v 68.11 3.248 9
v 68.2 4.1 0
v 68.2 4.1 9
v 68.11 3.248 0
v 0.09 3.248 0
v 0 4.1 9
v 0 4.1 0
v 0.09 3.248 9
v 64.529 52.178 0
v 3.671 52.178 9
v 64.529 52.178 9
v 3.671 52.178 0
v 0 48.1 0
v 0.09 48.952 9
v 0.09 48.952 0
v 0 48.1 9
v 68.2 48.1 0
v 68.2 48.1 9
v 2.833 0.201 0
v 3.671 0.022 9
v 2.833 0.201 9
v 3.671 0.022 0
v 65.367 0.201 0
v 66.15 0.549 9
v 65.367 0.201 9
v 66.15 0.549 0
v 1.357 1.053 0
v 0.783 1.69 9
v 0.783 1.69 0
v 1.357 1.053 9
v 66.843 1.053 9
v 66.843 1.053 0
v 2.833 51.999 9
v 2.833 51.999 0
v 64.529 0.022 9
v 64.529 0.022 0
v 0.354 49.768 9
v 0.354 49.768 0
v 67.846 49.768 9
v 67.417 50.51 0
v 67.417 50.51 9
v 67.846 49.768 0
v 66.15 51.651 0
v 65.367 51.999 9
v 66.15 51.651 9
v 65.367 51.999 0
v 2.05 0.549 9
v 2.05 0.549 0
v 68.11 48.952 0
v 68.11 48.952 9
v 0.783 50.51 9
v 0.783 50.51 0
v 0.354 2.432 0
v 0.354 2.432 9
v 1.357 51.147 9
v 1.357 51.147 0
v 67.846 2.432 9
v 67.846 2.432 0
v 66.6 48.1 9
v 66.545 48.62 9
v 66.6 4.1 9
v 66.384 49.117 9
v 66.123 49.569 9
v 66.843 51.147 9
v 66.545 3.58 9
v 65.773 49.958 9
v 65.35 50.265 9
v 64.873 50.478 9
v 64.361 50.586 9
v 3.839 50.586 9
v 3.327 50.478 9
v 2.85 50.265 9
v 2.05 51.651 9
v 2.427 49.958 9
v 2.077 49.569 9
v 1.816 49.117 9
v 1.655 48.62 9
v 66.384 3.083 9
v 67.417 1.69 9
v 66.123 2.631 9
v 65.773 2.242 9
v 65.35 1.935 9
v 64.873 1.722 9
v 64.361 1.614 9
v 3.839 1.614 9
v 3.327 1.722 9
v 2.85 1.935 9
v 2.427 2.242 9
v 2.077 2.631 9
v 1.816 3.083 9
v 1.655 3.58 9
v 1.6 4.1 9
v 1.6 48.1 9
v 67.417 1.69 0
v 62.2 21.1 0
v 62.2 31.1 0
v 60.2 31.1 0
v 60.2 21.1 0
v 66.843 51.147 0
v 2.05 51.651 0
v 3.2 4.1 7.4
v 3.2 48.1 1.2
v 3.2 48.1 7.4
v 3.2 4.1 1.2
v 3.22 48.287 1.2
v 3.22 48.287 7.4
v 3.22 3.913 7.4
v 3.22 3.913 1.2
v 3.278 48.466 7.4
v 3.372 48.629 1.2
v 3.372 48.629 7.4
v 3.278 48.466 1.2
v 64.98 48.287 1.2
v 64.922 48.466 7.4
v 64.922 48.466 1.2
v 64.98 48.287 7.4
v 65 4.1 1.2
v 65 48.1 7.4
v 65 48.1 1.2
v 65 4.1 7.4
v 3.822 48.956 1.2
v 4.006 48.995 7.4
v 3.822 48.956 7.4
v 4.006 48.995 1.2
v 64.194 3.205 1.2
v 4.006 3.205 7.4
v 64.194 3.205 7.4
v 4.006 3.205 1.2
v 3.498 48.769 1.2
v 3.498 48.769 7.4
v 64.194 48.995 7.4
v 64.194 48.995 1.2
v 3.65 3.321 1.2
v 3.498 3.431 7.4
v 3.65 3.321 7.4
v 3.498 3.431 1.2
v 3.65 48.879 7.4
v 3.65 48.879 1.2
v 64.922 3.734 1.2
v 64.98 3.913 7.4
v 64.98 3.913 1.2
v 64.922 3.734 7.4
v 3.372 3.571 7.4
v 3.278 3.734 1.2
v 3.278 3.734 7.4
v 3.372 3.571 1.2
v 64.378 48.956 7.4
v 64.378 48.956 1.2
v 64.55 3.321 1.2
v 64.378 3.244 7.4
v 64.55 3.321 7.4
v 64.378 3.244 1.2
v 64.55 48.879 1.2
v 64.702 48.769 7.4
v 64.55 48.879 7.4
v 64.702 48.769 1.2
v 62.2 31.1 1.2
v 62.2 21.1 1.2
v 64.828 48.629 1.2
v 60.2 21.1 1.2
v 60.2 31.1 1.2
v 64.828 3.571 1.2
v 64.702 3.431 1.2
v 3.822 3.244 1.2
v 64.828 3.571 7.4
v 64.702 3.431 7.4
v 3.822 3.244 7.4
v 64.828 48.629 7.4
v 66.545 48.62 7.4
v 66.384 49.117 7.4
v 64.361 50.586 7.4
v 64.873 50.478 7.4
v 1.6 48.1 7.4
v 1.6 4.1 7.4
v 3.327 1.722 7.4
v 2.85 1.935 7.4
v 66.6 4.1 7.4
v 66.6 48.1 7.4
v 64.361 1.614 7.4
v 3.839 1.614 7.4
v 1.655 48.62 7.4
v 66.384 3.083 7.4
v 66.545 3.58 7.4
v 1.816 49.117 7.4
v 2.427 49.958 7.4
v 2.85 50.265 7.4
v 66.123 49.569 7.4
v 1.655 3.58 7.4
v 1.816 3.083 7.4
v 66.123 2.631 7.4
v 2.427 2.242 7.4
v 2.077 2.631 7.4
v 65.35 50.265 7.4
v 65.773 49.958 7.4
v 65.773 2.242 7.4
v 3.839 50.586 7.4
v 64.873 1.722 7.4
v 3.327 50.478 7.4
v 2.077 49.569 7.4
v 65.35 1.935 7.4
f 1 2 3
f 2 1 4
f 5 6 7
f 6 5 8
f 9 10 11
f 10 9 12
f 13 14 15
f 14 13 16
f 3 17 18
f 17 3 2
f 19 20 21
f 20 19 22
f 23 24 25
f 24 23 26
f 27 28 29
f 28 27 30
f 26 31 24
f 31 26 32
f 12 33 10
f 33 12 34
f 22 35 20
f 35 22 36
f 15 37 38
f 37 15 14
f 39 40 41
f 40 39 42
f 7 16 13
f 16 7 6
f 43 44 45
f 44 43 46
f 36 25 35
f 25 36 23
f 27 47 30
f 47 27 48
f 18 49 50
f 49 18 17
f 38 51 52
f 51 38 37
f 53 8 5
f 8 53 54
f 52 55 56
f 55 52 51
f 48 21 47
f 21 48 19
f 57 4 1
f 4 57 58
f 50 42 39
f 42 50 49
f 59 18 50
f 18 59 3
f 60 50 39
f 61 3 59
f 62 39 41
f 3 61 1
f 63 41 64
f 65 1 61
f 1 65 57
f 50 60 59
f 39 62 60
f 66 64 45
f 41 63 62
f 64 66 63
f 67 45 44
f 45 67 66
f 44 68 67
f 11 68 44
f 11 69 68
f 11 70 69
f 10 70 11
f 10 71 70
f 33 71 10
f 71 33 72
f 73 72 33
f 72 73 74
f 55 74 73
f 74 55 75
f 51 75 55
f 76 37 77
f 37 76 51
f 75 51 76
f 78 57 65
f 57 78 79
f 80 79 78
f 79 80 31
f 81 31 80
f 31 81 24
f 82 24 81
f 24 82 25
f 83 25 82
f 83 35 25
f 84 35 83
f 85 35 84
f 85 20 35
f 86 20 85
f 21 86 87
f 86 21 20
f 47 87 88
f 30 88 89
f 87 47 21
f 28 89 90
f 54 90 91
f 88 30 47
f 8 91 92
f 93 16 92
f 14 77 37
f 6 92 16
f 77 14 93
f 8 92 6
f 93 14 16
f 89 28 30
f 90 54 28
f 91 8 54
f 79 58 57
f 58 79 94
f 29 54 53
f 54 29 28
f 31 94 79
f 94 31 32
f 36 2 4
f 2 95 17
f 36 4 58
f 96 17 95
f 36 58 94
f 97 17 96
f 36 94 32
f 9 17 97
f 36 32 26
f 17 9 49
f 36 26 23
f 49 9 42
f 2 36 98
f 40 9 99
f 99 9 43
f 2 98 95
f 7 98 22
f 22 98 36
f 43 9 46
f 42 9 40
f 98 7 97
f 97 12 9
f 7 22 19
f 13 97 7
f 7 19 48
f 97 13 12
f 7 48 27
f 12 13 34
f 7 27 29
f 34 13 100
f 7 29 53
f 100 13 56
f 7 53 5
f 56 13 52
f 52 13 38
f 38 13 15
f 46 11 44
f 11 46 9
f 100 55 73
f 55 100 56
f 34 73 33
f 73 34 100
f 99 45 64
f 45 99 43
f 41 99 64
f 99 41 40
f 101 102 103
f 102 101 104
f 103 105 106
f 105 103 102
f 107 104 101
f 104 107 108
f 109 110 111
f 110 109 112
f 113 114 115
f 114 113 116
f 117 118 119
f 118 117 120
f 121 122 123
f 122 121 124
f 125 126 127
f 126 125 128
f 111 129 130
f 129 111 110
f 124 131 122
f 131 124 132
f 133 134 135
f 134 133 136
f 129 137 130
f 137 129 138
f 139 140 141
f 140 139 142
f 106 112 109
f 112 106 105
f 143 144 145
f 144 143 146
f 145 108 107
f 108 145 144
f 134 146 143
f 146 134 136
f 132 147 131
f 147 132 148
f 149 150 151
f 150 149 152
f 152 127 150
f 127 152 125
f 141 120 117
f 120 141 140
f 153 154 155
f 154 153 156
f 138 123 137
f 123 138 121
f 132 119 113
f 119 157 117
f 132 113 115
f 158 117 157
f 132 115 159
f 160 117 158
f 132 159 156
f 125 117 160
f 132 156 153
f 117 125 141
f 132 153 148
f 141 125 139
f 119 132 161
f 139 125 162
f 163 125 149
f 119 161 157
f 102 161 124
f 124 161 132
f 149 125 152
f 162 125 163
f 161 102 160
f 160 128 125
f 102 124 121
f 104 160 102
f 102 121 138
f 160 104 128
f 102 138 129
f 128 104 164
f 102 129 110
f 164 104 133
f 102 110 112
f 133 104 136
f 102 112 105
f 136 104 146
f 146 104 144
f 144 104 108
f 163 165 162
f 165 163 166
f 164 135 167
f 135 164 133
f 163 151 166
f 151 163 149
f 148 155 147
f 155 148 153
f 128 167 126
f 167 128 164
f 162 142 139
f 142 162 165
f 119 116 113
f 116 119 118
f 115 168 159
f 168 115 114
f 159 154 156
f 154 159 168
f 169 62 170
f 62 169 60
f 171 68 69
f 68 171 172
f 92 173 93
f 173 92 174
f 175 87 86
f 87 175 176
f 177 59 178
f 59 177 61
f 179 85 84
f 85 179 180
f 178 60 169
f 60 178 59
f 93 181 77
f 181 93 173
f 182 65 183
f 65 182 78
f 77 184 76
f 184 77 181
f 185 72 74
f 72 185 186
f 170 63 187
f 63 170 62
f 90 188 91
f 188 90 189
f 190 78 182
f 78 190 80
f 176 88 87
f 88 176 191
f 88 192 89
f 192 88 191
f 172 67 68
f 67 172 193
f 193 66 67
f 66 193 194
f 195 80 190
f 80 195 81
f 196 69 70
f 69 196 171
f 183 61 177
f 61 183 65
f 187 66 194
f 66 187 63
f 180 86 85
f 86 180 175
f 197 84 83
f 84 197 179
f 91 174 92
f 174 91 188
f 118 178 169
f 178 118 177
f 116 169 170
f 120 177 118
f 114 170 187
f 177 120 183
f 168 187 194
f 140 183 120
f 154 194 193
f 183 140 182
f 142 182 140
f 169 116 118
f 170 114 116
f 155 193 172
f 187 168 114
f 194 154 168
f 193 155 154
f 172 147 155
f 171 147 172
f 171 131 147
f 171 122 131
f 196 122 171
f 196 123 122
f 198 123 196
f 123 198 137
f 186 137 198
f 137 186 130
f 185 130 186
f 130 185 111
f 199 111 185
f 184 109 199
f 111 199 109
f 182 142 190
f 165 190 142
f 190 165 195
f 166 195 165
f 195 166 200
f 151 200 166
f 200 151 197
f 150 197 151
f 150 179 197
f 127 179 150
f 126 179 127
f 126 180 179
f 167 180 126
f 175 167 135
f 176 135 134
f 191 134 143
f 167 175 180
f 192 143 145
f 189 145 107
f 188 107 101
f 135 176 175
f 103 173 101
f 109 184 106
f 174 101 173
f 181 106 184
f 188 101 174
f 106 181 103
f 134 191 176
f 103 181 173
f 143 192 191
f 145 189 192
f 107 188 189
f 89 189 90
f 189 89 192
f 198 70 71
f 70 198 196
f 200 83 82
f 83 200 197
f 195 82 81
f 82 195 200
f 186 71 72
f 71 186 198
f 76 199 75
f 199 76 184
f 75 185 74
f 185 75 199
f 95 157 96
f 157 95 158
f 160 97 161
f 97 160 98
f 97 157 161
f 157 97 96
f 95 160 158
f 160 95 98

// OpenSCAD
$fn = 30;


tp_h = 1.6;
tp_w = 65.0;
tp_d = 49.0;
tp_r = 2.5;

wall_t = 1.6;
base_t = 1.2;

box_h = 9;
box_w = tp_w + 2*wall_t;
box_d = tp_d + 2*wall_t;
box_r = tp_r + wall_t;
box_inner_l = 2*wall_t;
box_inner_w = box_w - 2*box_inner_l;
box_inner_d = box_d - 2*box_inner_l;
box_inner_r = tp_r - wall_t;

module rounded_cube(x, y, z, r) {
    hull() {
        translate([r, r, 0])
        cylinder(r=r, h=z, center=false);
        translate([x-r, r, 0])
        cylinder(r=r, h=z, center=false);
        translate([x-r, y-r, 0])
        cylinder(r=r, h=z, center=false);
        translate([r, y-r, 0])
        cylinder(r=r, h=z, center=false);
    }
}


difference() {
    rounded_cube(box_w, box_d, box_h, box_r);
    translate([box_inner_l, box_inner_l, base_t])
        rounded_cube(box_inner_w, box_inner_d, box_h, box_inner_r);
    translate([wall_t, wall_t, box_h-tp_h])
        rounded_cube(tp_w, tp_d, tp_h+0.1, tp_r);
    translate([box_w - 8, box_d/2-5, -0.1])
        cube([2, 10, base_t+0.2]);
}
